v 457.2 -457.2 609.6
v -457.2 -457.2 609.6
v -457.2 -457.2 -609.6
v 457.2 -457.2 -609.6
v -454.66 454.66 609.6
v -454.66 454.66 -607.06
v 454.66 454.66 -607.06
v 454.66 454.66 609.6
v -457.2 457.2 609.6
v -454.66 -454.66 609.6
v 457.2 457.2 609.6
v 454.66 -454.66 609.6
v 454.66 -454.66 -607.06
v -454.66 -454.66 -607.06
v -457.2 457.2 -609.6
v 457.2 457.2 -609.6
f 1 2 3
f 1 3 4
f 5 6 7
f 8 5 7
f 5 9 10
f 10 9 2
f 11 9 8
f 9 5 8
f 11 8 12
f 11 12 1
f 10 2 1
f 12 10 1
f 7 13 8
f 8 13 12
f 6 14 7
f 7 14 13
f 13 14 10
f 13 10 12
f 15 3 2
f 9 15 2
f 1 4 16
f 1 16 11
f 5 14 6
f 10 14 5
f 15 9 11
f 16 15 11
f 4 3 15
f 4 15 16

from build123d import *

# Parameters (mm, degrees)
F0_W     = 914.4
F0_H     = 1219.2
F1_DEPTH = 457.2
F2_T     = -2.54


with BuildPart() as f1:
    # F0 (on Front) → F1 (new body, symmetric)
    with BuildSketch(Plane.XZ):
        Rectangle(F0_W, F0_H)
    extrude(amount=F1_DEPTH, both=True)

    # F2
    f2_openings = [f1.faces().sort_by_distance(p)[0] for p in [
        (0, 0, 609.6),
    ]]
    offset(amount=F2_T, openings=f2_openings)


solid = f1.part
